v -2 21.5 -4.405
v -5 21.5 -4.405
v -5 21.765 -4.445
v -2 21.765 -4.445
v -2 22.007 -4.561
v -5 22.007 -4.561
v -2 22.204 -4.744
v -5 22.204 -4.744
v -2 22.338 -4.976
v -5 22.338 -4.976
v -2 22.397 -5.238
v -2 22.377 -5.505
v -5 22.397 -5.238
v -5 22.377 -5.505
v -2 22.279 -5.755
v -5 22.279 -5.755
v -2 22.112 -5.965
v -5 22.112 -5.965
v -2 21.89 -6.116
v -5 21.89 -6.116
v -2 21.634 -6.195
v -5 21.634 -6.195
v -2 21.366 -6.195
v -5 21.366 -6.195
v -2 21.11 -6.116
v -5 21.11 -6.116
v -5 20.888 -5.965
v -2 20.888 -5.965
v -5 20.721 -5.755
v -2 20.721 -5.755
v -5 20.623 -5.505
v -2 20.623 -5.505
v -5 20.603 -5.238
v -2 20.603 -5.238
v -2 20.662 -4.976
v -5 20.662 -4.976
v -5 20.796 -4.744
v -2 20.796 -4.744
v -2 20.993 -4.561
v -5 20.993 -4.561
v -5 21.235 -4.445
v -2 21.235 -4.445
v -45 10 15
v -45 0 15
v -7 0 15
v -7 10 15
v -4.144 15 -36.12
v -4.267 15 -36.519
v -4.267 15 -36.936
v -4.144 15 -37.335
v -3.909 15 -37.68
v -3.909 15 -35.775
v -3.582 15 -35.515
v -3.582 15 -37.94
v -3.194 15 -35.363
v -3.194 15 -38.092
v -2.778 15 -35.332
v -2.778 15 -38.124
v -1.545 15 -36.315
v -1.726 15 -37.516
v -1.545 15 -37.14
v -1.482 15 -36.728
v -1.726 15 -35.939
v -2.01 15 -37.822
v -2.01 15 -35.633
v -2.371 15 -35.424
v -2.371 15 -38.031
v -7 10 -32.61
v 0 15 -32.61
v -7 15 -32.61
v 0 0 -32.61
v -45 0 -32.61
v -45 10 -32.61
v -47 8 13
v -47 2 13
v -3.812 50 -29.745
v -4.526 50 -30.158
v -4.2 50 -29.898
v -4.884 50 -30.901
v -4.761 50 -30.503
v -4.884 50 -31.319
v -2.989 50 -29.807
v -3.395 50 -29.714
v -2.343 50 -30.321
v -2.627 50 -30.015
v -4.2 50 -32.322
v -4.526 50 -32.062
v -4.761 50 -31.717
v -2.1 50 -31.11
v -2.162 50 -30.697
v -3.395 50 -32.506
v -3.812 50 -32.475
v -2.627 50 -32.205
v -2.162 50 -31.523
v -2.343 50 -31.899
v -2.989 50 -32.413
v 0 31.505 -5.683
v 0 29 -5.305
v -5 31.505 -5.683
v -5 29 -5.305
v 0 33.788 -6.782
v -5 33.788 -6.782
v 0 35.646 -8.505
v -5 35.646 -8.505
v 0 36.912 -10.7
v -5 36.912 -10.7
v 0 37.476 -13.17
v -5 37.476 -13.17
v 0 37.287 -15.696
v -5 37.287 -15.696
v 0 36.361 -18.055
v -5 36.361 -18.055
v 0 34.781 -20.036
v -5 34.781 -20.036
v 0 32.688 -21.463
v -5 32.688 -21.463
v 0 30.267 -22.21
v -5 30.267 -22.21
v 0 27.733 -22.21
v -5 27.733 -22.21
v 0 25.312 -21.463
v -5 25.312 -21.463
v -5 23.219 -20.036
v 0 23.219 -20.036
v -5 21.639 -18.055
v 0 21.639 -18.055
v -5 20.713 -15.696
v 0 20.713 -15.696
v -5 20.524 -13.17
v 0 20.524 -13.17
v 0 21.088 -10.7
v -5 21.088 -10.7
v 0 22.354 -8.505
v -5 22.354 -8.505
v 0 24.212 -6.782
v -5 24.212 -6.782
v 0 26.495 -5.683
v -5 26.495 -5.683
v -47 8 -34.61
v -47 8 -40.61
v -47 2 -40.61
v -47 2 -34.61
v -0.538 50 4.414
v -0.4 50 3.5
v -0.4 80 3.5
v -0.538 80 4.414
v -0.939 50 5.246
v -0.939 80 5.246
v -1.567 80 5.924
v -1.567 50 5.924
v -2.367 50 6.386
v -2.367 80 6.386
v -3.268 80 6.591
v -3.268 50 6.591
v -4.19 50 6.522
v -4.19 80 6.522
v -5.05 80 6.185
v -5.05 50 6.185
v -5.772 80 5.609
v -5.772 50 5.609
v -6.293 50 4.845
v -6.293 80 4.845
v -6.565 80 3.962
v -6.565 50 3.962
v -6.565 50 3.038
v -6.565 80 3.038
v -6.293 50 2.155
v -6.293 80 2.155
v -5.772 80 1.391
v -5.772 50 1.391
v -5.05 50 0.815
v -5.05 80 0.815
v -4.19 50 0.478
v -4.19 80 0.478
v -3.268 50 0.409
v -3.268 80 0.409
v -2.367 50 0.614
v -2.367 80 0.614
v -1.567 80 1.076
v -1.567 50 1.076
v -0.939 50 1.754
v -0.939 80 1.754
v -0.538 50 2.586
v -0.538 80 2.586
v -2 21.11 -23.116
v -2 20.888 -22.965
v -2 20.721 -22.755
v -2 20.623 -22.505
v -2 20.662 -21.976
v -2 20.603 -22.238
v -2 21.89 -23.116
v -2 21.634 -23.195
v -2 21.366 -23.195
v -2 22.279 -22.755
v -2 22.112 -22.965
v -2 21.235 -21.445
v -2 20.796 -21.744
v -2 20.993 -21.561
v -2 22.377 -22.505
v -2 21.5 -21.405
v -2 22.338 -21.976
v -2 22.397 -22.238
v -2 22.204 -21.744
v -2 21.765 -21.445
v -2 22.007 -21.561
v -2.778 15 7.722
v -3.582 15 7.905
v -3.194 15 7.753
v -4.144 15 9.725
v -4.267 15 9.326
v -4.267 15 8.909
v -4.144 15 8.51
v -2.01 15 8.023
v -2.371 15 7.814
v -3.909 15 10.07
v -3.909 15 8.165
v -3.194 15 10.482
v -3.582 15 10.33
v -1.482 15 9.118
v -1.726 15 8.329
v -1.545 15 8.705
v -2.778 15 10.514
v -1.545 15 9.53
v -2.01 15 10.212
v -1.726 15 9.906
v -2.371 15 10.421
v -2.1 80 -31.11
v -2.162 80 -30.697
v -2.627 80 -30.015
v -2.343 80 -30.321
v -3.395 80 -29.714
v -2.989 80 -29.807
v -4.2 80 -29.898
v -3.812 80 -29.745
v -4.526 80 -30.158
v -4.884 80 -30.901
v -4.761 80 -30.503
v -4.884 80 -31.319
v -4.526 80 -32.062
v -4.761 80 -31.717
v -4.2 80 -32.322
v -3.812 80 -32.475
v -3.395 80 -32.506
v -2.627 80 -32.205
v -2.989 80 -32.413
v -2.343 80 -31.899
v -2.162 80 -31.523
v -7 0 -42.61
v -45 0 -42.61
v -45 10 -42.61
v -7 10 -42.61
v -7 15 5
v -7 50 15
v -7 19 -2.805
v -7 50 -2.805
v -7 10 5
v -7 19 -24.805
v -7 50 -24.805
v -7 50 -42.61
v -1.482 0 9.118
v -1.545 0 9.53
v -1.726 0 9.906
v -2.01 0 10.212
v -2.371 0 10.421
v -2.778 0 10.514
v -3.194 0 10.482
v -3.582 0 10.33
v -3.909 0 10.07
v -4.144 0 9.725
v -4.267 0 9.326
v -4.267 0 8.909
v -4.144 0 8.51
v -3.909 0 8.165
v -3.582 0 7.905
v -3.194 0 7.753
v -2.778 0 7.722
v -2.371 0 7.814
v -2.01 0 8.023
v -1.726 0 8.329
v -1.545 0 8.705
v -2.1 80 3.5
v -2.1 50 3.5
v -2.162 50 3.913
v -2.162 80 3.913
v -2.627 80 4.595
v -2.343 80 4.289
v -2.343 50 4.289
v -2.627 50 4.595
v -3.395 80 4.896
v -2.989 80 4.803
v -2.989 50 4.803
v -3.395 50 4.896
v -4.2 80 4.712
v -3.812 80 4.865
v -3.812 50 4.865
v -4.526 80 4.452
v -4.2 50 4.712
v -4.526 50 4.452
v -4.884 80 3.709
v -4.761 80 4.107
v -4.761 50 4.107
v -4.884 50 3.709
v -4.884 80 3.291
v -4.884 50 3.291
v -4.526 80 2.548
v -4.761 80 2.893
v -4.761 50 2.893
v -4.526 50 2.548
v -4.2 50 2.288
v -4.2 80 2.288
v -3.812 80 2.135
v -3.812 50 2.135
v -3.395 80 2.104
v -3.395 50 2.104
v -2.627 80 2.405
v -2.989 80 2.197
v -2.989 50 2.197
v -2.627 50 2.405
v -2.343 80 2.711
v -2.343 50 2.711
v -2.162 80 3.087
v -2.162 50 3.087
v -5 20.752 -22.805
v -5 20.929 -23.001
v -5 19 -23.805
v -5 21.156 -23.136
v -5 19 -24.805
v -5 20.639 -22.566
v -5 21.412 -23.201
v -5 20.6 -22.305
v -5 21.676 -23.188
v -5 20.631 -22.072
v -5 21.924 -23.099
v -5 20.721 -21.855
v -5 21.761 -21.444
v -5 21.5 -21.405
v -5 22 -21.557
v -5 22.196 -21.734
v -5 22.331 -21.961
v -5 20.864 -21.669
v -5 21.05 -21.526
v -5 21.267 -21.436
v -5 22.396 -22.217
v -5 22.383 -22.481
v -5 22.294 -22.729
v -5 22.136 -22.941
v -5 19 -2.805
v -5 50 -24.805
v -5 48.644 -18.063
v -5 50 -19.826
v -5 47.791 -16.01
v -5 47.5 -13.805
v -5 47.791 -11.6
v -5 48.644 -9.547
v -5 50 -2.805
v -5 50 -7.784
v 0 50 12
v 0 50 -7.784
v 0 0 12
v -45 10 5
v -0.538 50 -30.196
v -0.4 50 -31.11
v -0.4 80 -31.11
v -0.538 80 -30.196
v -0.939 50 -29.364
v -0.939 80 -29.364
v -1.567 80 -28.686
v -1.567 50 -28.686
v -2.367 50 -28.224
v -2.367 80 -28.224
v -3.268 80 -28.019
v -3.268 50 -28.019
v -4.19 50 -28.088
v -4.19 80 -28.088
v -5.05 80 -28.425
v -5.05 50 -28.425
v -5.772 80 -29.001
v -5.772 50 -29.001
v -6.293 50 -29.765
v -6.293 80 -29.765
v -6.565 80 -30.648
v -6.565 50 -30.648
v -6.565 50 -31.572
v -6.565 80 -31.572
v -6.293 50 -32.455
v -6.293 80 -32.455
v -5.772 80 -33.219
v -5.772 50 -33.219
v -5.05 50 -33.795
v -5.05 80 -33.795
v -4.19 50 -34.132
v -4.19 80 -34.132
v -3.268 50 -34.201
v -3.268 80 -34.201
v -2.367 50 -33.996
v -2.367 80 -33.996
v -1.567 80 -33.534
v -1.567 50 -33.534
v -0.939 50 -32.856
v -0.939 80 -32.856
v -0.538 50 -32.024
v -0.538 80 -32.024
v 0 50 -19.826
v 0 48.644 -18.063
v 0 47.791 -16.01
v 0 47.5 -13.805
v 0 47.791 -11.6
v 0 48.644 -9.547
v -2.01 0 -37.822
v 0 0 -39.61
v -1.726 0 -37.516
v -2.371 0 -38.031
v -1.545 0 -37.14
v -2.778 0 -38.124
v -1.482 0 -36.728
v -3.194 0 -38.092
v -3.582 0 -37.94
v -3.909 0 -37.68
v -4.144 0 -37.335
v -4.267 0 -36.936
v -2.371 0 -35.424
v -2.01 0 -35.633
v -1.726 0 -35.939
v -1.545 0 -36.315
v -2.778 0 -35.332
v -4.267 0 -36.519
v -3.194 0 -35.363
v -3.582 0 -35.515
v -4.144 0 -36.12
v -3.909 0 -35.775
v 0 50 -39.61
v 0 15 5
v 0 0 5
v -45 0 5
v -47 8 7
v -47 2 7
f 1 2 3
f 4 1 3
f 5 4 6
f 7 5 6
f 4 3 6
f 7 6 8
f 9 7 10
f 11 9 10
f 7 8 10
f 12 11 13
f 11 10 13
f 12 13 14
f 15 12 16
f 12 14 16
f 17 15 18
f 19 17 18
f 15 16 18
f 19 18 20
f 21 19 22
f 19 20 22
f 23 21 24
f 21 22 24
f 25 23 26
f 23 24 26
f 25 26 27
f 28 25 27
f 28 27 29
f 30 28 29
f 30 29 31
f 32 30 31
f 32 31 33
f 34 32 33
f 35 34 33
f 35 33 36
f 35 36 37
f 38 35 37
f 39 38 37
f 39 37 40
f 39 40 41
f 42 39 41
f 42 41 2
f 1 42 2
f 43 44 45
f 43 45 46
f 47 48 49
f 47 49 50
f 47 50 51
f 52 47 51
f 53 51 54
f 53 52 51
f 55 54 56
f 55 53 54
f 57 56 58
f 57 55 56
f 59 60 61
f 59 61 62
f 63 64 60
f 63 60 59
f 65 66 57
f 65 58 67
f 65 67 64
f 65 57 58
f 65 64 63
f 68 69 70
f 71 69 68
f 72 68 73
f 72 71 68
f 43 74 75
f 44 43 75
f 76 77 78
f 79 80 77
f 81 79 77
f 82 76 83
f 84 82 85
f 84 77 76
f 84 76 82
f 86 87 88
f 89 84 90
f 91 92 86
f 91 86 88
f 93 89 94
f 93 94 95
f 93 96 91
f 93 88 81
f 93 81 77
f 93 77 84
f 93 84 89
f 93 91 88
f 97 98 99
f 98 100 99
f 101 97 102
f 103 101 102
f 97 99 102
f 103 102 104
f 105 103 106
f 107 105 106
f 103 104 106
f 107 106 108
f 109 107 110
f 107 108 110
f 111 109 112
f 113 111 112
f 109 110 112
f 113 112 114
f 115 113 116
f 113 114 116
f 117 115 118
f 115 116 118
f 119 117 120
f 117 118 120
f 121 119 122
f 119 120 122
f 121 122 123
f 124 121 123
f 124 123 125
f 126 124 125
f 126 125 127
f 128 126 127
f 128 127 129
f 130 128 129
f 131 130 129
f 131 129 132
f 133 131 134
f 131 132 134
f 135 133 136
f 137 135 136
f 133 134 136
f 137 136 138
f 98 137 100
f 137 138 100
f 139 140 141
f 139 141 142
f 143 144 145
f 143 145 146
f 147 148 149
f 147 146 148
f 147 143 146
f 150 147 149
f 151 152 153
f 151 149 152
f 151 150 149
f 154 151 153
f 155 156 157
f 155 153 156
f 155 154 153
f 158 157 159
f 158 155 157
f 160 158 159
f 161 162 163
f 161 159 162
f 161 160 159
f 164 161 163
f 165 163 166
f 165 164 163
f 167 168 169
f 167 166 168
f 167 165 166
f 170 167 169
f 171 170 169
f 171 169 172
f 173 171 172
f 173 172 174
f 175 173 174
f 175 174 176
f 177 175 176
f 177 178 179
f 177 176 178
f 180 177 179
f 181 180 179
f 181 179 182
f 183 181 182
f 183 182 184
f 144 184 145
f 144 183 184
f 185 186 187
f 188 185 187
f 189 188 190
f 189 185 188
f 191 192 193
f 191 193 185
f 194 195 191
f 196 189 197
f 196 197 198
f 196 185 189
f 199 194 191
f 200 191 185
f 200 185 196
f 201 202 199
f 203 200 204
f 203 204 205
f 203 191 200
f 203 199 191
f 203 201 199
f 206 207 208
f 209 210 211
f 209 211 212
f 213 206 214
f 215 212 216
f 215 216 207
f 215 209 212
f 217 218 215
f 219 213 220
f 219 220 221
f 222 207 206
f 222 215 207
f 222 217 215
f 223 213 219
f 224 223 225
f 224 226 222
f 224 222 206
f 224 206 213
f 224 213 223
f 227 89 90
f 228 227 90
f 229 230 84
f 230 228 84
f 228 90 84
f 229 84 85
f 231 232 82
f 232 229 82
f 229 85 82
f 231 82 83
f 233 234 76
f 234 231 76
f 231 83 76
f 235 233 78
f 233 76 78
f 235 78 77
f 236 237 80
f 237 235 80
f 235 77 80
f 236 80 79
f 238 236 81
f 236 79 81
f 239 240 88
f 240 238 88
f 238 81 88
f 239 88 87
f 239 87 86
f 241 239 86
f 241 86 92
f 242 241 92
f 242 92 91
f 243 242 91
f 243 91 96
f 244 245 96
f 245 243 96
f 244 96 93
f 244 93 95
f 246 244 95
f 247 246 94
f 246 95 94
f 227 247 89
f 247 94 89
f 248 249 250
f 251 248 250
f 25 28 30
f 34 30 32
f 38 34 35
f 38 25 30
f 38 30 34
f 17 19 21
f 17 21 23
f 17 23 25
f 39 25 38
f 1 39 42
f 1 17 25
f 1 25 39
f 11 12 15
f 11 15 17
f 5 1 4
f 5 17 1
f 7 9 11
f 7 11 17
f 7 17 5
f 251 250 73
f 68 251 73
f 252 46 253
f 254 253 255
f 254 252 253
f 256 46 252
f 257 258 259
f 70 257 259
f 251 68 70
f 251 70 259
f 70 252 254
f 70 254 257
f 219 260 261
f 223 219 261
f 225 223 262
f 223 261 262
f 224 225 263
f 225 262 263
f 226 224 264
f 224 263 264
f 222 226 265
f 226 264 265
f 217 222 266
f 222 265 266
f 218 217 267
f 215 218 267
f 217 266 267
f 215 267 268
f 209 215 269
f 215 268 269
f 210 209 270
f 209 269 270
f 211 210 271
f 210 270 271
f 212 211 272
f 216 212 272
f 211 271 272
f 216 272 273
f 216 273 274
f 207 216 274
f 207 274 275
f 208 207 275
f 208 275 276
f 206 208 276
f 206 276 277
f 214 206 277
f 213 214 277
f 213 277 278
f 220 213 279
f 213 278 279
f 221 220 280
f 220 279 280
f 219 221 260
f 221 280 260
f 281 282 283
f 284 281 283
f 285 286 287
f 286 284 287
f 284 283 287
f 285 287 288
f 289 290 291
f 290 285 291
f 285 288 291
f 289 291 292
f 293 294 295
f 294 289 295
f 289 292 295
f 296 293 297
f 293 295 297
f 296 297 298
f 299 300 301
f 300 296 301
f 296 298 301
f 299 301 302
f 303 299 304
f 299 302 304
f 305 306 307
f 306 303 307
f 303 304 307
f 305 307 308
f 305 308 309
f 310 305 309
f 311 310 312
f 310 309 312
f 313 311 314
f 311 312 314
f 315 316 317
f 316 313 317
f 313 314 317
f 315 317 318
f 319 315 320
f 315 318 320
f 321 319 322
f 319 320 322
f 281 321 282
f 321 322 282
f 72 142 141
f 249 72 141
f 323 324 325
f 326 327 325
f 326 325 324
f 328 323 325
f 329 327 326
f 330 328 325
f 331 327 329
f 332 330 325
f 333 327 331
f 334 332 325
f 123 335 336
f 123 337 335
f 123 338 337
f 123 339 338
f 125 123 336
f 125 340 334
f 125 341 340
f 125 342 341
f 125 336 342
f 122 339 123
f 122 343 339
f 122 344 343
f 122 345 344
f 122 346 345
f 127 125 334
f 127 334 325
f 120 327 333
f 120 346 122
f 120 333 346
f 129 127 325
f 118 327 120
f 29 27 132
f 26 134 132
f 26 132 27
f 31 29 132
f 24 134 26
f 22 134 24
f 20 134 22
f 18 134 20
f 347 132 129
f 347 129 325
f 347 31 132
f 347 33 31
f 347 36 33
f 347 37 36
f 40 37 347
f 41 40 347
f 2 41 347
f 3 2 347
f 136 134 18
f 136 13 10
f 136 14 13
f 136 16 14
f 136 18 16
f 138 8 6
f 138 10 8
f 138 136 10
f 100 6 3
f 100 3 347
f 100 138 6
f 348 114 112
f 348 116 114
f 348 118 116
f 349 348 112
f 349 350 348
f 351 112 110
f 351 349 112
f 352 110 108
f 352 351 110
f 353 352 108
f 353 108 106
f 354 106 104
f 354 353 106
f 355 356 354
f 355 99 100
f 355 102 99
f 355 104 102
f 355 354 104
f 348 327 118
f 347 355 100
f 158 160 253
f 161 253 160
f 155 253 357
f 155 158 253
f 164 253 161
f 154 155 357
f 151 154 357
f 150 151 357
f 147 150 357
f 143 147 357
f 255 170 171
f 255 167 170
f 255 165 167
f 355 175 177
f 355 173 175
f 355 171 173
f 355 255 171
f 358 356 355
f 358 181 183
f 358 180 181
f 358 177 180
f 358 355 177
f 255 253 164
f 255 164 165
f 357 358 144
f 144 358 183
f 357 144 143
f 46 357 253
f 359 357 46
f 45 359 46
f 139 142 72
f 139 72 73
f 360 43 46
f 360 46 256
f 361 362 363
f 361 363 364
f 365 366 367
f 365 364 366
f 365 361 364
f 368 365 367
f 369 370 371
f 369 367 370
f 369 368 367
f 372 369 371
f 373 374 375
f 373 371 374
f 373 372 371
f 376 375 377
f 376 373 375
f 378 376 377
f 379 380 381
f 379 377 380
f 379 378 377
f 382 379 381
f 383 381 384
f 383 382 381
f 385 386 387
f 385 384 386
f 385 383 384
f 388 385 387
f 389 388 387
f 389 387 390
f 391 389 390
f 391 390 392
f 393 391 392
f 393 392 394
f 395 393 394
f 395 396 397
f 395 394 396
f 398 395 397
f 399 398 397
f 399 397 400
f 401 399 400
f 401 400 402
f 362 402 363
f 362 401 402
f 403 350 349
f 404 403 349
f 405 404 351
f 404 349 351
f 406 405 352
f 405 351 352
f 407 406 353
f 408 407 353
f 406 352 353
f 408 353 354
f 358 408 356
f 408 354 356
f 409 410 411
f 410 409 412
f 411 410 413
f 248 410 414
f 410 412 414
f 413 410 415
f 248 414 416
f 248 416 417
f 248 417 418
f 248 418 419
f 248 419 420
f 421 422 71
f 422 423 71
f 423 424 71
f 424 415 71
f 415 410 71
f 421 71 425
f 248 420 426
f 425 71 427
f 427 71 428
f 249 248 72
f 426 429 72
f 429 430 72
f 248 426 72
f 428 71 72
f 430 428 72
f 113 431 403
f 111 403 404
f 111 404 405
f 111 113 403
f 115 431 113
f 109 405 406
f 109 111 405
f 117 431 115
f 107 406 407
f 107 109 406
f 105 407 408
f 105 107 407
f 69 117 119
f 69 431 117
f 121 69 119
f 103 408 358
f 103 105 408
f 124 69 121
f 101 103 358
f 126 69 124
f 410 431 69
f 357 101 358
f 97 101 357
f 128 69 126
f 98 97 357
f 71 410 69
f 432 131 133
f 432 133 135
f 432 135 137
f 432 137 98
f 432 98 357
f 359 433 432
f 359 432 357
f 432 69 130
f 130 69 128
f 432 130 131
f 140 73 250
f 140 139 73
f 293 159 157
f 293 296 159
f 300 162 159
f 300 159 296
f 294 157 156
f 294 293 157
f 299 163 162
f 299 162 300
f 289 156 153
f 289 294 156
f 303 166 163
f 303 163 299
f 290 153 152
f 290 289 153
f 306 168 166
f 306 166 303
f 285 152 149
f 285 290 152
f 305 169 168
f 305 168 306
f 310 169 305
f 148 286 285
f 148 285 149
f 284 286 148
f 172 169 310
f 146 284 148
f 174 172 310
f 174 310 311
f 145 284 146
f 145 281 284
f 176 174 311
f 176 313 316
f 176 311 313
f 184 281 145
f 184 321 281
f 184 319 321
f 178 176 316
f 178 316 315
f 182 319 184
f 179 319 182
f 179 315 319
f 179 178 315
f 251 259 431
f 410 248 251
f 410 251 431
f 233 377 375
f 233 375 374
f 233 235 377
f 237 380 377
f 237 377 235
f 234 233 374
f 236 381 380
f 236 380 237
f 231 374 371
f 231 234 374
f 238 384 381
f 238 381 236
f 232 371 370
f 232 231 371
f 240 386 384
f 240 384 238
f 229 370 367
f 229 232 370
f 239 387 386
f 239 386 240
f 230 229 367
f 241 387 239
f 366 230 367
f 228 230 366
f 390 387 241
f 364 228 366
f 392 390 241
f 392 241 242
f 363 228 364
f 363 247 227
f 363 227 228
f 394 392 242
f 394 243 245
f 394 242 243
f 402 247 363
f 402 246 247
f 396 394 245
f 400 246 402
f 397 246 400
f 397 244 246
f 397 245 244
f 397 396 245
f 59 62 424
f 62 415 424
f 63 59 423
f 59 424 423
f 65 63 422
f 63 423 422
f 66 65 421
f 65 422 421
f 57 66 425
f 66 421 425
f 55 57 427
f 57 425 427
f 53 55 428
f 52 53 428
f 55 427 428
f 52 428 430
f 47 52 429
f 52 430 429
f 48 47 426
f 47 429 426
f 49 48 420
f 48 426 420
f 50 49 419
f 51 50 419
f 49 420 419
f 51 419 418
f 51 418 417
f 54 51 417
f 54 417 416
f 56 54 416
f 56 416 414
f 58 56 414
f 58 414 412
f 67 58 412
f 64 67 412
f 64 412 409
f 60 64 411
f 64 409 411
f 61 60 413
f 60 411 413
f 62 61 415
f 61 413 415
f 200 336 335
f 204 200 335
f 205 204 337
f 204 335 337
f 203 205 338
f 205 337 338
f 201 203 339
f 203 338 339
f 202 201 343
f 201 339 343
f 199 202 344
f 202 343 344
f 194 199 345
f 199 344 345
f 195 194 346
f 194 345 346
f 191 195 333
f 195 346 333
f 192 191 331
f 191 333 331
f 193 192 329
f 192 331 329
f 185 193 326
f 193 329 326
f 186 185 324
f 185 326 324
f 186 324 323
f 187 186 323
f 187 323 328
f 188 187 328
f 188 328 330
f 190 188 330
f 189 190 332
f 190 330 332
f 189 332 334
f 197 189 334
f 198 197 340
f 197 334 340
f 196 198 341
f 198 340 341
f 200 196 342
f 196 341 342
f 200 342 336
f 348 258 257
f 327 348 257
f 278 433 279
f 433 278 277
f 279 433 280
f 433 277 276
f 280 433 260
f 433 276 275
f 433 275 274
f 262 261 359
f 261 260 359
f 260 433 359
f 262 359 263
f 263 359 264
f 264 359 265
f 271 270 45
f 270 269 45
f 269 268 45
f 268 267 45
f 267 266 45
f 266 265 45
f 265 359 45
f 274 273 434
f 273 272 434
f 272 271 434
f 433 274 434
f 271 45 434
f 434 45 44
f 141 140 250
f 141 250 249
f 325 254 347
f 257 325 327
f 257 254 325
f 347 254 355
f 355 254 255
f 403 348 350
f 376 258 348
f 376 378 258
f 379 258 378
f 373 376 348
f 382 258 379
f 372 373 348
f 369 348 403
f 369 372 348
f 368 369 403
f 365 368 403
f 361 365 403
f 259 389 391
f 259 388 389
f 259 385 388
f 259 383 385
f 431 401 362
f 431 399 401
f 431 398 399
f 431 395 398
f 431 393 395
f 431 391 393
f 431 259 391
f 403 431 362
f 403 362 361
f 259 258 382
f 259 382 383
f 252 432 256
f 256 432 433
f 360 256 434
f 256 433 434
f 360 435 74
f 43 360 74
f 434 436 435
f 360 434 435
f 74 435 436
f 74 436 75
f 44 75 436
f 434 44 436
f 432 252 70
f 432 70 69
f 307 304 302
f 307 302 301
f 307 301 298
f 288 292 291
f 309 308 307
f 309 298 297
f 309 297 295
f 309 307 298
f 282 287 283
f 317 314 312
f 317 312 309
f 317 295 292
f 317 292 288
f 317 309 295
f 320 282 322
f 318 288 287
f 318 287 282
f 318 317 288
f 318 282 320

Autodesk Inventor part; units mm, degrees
ref_plane "YZ Plane" through (0, 0, 0) normal (1, 0, 0) x (0, 1, 0)
ref_plane "XZ Plane" through (0, 0, 0) normal (0, 1, 0) x (-1, 0, 0)
ref_plane "XY Plane" through (0, 0, 0) normal (0, 0, 1) x (1, 0, 0)
sketch "Sketch1" plane through (0, 0, 0) normal (0, 1, 0) x (-1, 0, 0)
  line L0 (0, 5) -> (0, 12)
  line L1 (0, 5) -> (7, 5)
  line L2 (7, 5) -> (7, 15)
  line L3 (7, 15) -> (0, 12)
  line L4 (0, -32.61) -> (7, -32.61)
  line L5 (7, -32.61) -> (7, -42.61)
  line L6 (0, -32.61) -> (0, -39.61)
  line L7 (0, -39.61) -> (7, -42.61)
  point P0 (0, 0)
  dimension "d2" = 5
  dimension "d3" = 7
  dimension "d5" = 7
  dimension "d6" = 10
  dimension "d7" = 7
  dimension "d8" = 10
  dimension "d9" = 7
extrude "Extrusion1" add sketch "Sketch1" along normal blind 15
sketch "Sketch2" plane through (0, 15, 0) normal (0, 1, 0) x (1, 0, 0)
  line L0 (-7, -15) -> (-7, 42.61)
  line L1 (-7, 42.61) -> (0, 39.61)
  line L2 (0, 39.61) -> (-7, 42.61) projected
  line L3 (0, 39.61) -> (0, -12)
  line L4 (0, -12) -> (-7, -15)
  point P0 (0, 0)
extrude "Extrusion2" add sketch "Sketch2" along normal blind 35
sketch "Sketch3" plane through (0, 50, 0) normal (0, 1, 0) x (1, 0, 0)
  line L0 (0, -12) -> (-7, -15) projected
  line L1 (-7, 42.61) -> (0, 39.61) projected
  circle A0 centre (-3.5, 31.11) radius 1.4
  circle A1 centre (-3.5, -3.5) radius 1.4
  circle A2 centre (-3.5, -3.5) radius 3.1
  circle A3 centre (-3.5, 31.11) radius 3.1
  point P0 (0, 0)
  dimension "d73" = 6.2
  dimension "d74" = 6.2
sketch "Sketch4" plane through (0, 0, 0) normal (0, -1, 0) x (1, 0, 0)
  line L0 (0, 5) -> (0, 12) projected
  line L1 (0, 12) -> (-7, 15) projected
  line L2 (-7, 15) -> (-7, 5) projected
  line L3 (-7, 5) -> (0, 5) projected
  line L4 (0, -32.61) -> (-7, -32.61) projected
  line L5 (-7, -32.61) -> (-7, -42.61) projected
  line L6 (-7, -42.61) -> (0, -39.61) projected
  line L7 (0, -39.61) -> (0, -32.61) projected
  line L8 (-7, -42.61) -> (0, -32.61)
  line L9 (0, -39.61) -> (-7, -32.61)
  line L10 (0, 5) -> (-7, 15)
  line L11 (-7, 15) -> (0, 12)
  line L12 (0, 12) -> (-7, 5)
  circle A0 centre (-2.8824, 9.1176) radius 1.4
  circle A1 centre (-2.8824, -36.7276) radius 1.4
  point P0 (0, 0)
  dimension "d14" = 2.8
  dimension "d15" = 2.8
extrude "Extrusion3" cut sketch "Sketch4" against normal blind 15 contours A0 L12 L10 | L10 L12 A0 | L12 L10 A0 | A0 L10 L12 | A1 L9 L8 | L8 L9 A1 | L9 L8 A1 | A1 L8 L9
extrude "Extrusion4" add sketch "Sketch3" along normal blind 30
sketch "Sketch6" plane through (-7, 0, -42.61) normal (-1, 0, 0) x (0, 0, 1)
  line L0 (10, 15) -> (47.61, 15) projected
  line L1 (28.805, 15) -> (28.805, 20)
  line L2 (28.805, 20) -> (38.805, 20)
  line L3 (38.805, 20) -> (38.805, 65)
  line L4 (38.805, 65) -> (18.805, 65)
  line L5 (18.805, 65) -> (18.805, 20)
  line L6 (18.805, 20) -> (28.805, 20)
  line L7 (18.805, 20) -> (18.805, 21.5)
  line L8 (18.805, 21.5) -> (20.305, 21.5)
  line L9 (38.805, 20) -> (38.805, 21.5)
  line L10 (38.805, 21.5) -> (37.305, 21.5)
  circle A0 centre (20.305, 21.5) radius 0.6
  circle A1 centre (37.305, 21.5) radius 0.6
  line L11 (28.805, 20) -> (28.805, 29)
  line L12 (28.805, 29) -> (28.805, 56)
  circle A2 centre (28.805, 29) radius 8.5
  circle A3 centre (28.805, 56) radius 8.5
  point P0 (42.61, 0)
  dimension "d26" = 5
  dimension "d27" = 10
  dimension "d28" = 45
  dimension "d29" = 20
  dimension "d30" = 1.5
  dimension "d31" = 1.5
  dimension "d32" = 1.5
  dimension "d33" = 1.5
  dimension "d34" = 1.2
  dimension "d35" = 1.2
  dimension "d36" = 9
  dimension "d37" = 27
  dimension "d38" = 17
  dimension "d39" = 17
extrude "Extrusion5" cut sketch "Sketch6" against normal through all contours A3 | A2 L12 L11 | L11 L12 A2
sketch "Sketch7" plane through (-7, 0, -42.61) normal (-1, 0, 0) x (0, 0, 1)
  line L0 (10, 15) -> (47.61, 15)
  line L1 (28.805, 15) -> (28.805, 20)
  line L2 (28.805, 20) -> (38.805, 20)
  line L3 (38.805, 20) -> (38.805, 65)
  line L4 (38.805, 65) -> (18.805, 65)
  line L5 (18.805, 65) -> (18.805, 20)
  line L6 (18.805, 20) -> (28.805, 20)
  line L7 (18.805, 20) -> (18.805, 21.5)
  line L8 (18.805, 21.5) -> (20.305, 21.5)
  line L9 (38.805, 20) -> (38.805, 21.5)
  line L10 (38.805, 21.5) -> (37.305, 21.5)
  circle A0 centre (20.305, 21.5) radius 0.9
  circle A1 centre (37.305, 21.5) radius 0.9
  line L11 (28.805, 20) -> (28.805, 29)
  line L12 (28.805, 29) -> (28.805, 56)
  circle A2 centre (28.805, 29) radius 8.5
  circle A3 centre (28.805, 56) radius 8.5
  point P0 (42.61, 0)
  point P1 (42.61, 0)
  dimension "d42" = 5
  dimension "d43" = 10
  dimension "d44" = 45
  dimension "d45" = 20
  dimension "d46" = 1.5
  dimension "d47" = 1.5
  dimension "d48" = 1.5
  dimension "d49" = 1.5
  dimension "d50" = 1.8
  dimension "d51" = 1.8
  dimension "d52" = 9
  dimension "d53" = 27
  dimension "d54" = 17
  dimension "d55" = 17
extrude "Extrusion6" cut sketch "Sketch7" against normal blind 5 contours A1 | A0
sketch "Sketch8" plane through (-7, 0, -42.61) normal (-1, 0, 0) x (0, 0, 1)
  circle A0 centre (20.305, 21.5) radius 0.9 projected
  line L0 (20.305, 21.5) -> (20.305, 20)
  line L1 (20.305, 20) -> (18.805, 20)
  line L2 (18.805, 20) -> (18.805, 19)
  line L3 (18.805, 19) -> (17.805, 19)
  line L4 (17.805, 19) -> (39.805, 19)
  line L5 (39.805, 19) -> (39.805, 66)
  line L6 (39.805, 66) -> (17.805, 66)
  line L7 (17.805, 66) -> (17.805, 19)
  point P0 (42.61, 0)
  dimension "d58" = 1.5
  dimension "d59" = 1.5
  dimension "d60" = 1
  dimension "d61" = 1
  dimension "d62" = 22
  dimension "d63" = 47
extrude "Extrusion7" cut sketch "Sketch8" against normal blind 2
sketch "Sketch9" plane through (-7, 0, -42.61) normal (-1, 0, 0) x (0, 0, 1)
  line L0 (10, 0) -> (0, 0)
  line L1 (0, 0) -> (0, 10)
  line L2 (0, 10) -> (10, 10)
  line L3 (10, 10) -> (10, 0)
  line L4 (47.61, 0) -> (57.61, 0)
  line L5 (57.61, 0) -> (57.61, 10)
  line L6 (57.61, 10) -> (47.61, 10)
  line L7 (47.61, 10) -> (47.61, 0)
  line L8 (57.61, 0) -> (47.61, 0) projected
  point P0 (42.61, 0)
  dimension "d66" = 10
  dimension "d67" = 10
extrude "Extrusion8" add sketch "Sketch9" along normal blind 40
chamfer "Chamfer1" distance 2 angle 45 8 edges at (-47, 5, -42.61) (-47, 0, -37.61) (-47, 5, -32.61) (-47, 10, -37.61) (-47, 0, 10) (-47, 5, 15) (-47, 5, 5) (-47, 10, 10)
properties part number "Back Support" material "ABS Plastic"
